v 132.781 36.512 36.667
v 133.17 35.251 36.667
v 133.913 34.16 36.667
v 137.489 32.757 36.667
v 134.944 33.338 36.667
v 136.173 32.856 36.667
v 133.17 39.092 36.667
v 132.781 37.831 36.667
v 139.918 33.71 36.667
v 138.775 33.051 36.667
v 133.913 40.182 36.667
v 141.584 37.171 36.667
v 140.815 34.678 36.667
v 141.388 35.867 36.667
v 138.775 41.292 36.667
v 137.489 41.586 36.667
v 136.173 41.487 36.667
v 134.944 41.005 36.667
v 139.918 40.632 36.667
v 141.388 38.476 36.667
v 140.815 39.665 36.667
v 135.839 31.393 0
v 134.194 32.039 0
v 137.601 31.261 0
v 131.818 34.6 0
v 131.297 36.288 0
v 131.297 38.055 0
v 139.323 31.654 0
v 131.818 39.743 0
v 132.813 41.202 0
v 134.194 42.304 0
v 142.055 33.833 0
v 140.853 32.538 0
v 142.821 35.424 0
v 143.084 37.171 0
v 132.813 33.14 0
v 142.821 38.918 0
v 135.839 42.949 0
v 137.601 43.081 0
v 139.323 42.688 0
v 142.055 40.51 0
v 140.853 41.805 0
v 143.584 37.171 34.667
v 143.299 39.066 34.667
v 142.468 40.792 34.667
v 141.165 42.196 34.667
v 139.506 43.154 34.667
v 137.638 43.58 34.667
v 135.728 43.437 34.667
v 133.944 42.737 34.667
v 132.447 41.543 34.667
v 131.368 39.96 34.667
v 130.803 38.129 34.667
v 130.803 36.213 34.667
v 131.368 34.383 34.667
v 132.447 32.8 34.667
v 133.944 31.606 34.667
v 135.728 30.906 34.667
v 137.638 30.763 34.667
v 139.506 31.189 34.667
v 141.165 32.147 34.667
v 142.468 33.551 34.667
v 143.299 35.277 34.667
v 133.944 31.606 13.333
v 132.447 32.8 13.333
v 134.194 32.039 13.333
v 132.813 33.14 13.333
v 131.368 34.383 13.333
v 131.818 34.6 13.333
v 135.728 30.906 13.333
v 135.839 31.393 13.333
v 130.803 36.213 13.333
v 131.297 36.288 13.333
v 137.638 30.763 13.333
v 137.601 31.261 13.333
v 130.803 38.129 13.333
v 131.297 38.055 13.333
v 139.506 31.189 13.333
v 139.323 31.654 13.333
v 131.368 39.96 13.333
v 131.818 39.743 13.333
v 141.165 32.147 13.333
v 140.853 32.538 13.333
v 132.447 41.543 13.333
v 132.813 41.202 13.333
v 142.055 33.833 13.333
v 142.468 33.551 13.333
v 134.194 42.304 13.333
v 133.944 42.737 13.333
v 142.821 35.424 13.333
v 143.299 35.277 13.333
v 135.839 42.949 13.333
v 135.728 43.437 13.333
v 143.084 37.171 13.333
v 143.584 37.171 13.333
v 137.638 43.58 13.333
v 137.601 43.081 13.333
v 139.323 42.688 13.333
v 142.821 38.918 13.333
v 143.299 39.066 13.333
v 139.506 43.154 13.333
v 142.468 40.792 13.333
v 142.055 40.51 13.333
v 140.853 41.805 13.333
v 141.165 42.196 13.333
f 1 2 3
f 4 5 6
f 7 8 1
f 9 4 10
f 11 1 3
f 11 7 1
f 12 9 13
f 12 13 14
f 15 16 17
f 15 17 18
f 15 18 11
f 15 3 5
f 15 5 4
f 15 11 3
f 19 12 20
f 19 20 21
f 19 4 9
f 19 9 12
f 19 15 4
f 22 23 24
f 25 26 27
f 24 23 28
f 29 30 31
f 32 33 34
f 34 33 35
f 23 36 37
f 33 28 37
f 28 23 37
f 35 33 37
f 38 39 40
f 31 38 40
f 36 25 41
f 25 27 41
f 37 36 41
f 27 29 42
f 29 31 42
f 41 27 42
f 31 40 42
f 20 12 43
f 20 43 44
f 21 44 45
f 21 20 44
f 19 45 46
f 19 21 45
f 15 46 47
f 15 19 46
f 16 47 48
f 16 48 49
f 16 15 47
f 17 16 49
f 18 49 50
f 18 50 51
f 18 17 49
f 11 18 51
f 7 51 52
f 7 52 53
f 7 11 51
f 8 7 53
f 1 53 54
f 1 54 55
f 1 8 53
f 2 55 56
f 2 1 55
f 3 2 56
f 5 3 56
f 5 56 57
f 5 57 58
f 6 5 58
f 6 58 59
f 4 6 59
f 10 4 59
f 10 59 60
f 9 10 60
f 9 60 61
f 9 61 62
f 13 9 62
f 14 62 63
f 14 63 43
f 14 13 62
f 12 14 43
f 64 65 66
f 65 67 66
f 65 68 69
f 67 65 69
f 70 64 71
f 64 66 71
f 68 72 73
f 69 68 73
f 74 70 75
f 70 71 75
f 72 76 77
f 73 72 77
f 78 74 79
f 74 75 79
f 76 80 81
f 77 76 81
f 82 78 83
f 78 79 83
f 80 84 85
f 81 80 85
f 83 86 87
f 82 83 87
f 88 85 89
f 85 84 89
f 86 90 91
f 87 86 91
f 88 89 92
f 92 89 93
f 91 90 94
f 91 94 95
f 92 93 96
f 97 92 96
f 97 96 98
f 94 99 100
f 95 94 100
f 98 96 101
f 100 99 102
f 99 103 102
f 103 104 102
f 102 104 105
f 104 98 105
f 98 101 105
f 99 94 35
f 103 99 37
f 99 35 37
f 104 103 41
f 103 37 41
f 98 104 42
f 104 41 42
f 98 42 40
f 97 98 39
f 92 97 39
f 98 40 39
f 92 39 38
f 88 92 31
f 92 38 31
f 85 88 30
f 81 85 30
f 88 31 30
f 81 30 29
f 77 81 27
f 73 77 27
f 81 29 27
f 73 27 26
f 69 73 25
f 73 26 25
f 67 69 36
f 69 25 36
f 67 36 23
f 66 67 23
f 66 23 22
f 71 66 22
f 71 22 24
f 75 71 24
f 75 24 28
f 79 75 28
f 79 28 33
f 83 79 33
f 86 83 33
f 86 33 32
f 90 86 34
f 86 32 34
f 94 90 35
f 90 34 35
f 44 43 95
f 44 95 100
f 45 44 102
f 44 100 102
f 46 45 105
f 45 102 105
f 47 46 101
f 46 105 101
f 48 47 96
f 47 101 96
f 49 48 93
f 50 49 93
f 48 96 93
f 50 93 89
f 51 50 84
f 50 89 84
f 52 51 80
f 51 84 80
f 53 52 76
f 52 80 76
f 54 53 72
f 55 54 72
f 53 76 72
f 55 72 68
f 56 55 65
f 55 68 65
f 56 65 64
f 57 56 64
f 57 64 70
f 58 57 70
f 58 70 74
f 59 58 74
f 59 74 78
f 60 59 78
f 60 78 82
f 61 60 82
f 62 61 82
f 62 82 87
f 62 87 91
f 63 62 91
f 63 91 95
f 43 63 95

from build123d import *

# Parameters (mm, degrees)
SKETCH1_R           = 5.926666667
BOSS_EXTRUDE1_DEPTH = 13.333333333
SKETCH2_R           = 6.426666667
BOSS_EXTRUDE2_DEPTH = 16.666666667
SKETCH3_R           = 6.426666667
BOSS_EXTRUDE3_DEPTH = 6.666666667
CHAMFER1_SIZE       = 2


with BuildPart() as part:
    # Sketch1 → Boss-Extrude1 (new body)
    with BuildSketch(Plane.XY):
        with Locations((137.157808662, 37.171292193)):
            Circle(SKETCH1_R)
    extrude(amount=BOSS_EXTRUDE1_DEPTH)

    # Sketch2 → Boss-Extrude2 (add)
    with BuildSketch(Plane.XY.offset(13.333333333)):
        with Locations((137.157808662, 37.171292193)):
            Circle(SKETCH2_R)
    extrude(amount=BOSS_EXTRUDE2_DEPTH)

    # Sketch3 → Boss-Extrude3 (add)
    with BuildSketch(Plane.XY.offset(30)):
        with Locations((137.157808662, 37.171292193)):
            Circle(SKETCH3_R)
    extrude(amount=BOSS_EXTRUDE3_DEPTH)

    # Chamfer1
    chamfer1_edges = [part.edges().sort_by_distance(p)[0] for p in [
        (130.731141995, 37.171292193, 36.666666667),
    ]]
    chamfer(chamfer1_edges, length=CHAMFER1_SIZE)


solid = part.part
